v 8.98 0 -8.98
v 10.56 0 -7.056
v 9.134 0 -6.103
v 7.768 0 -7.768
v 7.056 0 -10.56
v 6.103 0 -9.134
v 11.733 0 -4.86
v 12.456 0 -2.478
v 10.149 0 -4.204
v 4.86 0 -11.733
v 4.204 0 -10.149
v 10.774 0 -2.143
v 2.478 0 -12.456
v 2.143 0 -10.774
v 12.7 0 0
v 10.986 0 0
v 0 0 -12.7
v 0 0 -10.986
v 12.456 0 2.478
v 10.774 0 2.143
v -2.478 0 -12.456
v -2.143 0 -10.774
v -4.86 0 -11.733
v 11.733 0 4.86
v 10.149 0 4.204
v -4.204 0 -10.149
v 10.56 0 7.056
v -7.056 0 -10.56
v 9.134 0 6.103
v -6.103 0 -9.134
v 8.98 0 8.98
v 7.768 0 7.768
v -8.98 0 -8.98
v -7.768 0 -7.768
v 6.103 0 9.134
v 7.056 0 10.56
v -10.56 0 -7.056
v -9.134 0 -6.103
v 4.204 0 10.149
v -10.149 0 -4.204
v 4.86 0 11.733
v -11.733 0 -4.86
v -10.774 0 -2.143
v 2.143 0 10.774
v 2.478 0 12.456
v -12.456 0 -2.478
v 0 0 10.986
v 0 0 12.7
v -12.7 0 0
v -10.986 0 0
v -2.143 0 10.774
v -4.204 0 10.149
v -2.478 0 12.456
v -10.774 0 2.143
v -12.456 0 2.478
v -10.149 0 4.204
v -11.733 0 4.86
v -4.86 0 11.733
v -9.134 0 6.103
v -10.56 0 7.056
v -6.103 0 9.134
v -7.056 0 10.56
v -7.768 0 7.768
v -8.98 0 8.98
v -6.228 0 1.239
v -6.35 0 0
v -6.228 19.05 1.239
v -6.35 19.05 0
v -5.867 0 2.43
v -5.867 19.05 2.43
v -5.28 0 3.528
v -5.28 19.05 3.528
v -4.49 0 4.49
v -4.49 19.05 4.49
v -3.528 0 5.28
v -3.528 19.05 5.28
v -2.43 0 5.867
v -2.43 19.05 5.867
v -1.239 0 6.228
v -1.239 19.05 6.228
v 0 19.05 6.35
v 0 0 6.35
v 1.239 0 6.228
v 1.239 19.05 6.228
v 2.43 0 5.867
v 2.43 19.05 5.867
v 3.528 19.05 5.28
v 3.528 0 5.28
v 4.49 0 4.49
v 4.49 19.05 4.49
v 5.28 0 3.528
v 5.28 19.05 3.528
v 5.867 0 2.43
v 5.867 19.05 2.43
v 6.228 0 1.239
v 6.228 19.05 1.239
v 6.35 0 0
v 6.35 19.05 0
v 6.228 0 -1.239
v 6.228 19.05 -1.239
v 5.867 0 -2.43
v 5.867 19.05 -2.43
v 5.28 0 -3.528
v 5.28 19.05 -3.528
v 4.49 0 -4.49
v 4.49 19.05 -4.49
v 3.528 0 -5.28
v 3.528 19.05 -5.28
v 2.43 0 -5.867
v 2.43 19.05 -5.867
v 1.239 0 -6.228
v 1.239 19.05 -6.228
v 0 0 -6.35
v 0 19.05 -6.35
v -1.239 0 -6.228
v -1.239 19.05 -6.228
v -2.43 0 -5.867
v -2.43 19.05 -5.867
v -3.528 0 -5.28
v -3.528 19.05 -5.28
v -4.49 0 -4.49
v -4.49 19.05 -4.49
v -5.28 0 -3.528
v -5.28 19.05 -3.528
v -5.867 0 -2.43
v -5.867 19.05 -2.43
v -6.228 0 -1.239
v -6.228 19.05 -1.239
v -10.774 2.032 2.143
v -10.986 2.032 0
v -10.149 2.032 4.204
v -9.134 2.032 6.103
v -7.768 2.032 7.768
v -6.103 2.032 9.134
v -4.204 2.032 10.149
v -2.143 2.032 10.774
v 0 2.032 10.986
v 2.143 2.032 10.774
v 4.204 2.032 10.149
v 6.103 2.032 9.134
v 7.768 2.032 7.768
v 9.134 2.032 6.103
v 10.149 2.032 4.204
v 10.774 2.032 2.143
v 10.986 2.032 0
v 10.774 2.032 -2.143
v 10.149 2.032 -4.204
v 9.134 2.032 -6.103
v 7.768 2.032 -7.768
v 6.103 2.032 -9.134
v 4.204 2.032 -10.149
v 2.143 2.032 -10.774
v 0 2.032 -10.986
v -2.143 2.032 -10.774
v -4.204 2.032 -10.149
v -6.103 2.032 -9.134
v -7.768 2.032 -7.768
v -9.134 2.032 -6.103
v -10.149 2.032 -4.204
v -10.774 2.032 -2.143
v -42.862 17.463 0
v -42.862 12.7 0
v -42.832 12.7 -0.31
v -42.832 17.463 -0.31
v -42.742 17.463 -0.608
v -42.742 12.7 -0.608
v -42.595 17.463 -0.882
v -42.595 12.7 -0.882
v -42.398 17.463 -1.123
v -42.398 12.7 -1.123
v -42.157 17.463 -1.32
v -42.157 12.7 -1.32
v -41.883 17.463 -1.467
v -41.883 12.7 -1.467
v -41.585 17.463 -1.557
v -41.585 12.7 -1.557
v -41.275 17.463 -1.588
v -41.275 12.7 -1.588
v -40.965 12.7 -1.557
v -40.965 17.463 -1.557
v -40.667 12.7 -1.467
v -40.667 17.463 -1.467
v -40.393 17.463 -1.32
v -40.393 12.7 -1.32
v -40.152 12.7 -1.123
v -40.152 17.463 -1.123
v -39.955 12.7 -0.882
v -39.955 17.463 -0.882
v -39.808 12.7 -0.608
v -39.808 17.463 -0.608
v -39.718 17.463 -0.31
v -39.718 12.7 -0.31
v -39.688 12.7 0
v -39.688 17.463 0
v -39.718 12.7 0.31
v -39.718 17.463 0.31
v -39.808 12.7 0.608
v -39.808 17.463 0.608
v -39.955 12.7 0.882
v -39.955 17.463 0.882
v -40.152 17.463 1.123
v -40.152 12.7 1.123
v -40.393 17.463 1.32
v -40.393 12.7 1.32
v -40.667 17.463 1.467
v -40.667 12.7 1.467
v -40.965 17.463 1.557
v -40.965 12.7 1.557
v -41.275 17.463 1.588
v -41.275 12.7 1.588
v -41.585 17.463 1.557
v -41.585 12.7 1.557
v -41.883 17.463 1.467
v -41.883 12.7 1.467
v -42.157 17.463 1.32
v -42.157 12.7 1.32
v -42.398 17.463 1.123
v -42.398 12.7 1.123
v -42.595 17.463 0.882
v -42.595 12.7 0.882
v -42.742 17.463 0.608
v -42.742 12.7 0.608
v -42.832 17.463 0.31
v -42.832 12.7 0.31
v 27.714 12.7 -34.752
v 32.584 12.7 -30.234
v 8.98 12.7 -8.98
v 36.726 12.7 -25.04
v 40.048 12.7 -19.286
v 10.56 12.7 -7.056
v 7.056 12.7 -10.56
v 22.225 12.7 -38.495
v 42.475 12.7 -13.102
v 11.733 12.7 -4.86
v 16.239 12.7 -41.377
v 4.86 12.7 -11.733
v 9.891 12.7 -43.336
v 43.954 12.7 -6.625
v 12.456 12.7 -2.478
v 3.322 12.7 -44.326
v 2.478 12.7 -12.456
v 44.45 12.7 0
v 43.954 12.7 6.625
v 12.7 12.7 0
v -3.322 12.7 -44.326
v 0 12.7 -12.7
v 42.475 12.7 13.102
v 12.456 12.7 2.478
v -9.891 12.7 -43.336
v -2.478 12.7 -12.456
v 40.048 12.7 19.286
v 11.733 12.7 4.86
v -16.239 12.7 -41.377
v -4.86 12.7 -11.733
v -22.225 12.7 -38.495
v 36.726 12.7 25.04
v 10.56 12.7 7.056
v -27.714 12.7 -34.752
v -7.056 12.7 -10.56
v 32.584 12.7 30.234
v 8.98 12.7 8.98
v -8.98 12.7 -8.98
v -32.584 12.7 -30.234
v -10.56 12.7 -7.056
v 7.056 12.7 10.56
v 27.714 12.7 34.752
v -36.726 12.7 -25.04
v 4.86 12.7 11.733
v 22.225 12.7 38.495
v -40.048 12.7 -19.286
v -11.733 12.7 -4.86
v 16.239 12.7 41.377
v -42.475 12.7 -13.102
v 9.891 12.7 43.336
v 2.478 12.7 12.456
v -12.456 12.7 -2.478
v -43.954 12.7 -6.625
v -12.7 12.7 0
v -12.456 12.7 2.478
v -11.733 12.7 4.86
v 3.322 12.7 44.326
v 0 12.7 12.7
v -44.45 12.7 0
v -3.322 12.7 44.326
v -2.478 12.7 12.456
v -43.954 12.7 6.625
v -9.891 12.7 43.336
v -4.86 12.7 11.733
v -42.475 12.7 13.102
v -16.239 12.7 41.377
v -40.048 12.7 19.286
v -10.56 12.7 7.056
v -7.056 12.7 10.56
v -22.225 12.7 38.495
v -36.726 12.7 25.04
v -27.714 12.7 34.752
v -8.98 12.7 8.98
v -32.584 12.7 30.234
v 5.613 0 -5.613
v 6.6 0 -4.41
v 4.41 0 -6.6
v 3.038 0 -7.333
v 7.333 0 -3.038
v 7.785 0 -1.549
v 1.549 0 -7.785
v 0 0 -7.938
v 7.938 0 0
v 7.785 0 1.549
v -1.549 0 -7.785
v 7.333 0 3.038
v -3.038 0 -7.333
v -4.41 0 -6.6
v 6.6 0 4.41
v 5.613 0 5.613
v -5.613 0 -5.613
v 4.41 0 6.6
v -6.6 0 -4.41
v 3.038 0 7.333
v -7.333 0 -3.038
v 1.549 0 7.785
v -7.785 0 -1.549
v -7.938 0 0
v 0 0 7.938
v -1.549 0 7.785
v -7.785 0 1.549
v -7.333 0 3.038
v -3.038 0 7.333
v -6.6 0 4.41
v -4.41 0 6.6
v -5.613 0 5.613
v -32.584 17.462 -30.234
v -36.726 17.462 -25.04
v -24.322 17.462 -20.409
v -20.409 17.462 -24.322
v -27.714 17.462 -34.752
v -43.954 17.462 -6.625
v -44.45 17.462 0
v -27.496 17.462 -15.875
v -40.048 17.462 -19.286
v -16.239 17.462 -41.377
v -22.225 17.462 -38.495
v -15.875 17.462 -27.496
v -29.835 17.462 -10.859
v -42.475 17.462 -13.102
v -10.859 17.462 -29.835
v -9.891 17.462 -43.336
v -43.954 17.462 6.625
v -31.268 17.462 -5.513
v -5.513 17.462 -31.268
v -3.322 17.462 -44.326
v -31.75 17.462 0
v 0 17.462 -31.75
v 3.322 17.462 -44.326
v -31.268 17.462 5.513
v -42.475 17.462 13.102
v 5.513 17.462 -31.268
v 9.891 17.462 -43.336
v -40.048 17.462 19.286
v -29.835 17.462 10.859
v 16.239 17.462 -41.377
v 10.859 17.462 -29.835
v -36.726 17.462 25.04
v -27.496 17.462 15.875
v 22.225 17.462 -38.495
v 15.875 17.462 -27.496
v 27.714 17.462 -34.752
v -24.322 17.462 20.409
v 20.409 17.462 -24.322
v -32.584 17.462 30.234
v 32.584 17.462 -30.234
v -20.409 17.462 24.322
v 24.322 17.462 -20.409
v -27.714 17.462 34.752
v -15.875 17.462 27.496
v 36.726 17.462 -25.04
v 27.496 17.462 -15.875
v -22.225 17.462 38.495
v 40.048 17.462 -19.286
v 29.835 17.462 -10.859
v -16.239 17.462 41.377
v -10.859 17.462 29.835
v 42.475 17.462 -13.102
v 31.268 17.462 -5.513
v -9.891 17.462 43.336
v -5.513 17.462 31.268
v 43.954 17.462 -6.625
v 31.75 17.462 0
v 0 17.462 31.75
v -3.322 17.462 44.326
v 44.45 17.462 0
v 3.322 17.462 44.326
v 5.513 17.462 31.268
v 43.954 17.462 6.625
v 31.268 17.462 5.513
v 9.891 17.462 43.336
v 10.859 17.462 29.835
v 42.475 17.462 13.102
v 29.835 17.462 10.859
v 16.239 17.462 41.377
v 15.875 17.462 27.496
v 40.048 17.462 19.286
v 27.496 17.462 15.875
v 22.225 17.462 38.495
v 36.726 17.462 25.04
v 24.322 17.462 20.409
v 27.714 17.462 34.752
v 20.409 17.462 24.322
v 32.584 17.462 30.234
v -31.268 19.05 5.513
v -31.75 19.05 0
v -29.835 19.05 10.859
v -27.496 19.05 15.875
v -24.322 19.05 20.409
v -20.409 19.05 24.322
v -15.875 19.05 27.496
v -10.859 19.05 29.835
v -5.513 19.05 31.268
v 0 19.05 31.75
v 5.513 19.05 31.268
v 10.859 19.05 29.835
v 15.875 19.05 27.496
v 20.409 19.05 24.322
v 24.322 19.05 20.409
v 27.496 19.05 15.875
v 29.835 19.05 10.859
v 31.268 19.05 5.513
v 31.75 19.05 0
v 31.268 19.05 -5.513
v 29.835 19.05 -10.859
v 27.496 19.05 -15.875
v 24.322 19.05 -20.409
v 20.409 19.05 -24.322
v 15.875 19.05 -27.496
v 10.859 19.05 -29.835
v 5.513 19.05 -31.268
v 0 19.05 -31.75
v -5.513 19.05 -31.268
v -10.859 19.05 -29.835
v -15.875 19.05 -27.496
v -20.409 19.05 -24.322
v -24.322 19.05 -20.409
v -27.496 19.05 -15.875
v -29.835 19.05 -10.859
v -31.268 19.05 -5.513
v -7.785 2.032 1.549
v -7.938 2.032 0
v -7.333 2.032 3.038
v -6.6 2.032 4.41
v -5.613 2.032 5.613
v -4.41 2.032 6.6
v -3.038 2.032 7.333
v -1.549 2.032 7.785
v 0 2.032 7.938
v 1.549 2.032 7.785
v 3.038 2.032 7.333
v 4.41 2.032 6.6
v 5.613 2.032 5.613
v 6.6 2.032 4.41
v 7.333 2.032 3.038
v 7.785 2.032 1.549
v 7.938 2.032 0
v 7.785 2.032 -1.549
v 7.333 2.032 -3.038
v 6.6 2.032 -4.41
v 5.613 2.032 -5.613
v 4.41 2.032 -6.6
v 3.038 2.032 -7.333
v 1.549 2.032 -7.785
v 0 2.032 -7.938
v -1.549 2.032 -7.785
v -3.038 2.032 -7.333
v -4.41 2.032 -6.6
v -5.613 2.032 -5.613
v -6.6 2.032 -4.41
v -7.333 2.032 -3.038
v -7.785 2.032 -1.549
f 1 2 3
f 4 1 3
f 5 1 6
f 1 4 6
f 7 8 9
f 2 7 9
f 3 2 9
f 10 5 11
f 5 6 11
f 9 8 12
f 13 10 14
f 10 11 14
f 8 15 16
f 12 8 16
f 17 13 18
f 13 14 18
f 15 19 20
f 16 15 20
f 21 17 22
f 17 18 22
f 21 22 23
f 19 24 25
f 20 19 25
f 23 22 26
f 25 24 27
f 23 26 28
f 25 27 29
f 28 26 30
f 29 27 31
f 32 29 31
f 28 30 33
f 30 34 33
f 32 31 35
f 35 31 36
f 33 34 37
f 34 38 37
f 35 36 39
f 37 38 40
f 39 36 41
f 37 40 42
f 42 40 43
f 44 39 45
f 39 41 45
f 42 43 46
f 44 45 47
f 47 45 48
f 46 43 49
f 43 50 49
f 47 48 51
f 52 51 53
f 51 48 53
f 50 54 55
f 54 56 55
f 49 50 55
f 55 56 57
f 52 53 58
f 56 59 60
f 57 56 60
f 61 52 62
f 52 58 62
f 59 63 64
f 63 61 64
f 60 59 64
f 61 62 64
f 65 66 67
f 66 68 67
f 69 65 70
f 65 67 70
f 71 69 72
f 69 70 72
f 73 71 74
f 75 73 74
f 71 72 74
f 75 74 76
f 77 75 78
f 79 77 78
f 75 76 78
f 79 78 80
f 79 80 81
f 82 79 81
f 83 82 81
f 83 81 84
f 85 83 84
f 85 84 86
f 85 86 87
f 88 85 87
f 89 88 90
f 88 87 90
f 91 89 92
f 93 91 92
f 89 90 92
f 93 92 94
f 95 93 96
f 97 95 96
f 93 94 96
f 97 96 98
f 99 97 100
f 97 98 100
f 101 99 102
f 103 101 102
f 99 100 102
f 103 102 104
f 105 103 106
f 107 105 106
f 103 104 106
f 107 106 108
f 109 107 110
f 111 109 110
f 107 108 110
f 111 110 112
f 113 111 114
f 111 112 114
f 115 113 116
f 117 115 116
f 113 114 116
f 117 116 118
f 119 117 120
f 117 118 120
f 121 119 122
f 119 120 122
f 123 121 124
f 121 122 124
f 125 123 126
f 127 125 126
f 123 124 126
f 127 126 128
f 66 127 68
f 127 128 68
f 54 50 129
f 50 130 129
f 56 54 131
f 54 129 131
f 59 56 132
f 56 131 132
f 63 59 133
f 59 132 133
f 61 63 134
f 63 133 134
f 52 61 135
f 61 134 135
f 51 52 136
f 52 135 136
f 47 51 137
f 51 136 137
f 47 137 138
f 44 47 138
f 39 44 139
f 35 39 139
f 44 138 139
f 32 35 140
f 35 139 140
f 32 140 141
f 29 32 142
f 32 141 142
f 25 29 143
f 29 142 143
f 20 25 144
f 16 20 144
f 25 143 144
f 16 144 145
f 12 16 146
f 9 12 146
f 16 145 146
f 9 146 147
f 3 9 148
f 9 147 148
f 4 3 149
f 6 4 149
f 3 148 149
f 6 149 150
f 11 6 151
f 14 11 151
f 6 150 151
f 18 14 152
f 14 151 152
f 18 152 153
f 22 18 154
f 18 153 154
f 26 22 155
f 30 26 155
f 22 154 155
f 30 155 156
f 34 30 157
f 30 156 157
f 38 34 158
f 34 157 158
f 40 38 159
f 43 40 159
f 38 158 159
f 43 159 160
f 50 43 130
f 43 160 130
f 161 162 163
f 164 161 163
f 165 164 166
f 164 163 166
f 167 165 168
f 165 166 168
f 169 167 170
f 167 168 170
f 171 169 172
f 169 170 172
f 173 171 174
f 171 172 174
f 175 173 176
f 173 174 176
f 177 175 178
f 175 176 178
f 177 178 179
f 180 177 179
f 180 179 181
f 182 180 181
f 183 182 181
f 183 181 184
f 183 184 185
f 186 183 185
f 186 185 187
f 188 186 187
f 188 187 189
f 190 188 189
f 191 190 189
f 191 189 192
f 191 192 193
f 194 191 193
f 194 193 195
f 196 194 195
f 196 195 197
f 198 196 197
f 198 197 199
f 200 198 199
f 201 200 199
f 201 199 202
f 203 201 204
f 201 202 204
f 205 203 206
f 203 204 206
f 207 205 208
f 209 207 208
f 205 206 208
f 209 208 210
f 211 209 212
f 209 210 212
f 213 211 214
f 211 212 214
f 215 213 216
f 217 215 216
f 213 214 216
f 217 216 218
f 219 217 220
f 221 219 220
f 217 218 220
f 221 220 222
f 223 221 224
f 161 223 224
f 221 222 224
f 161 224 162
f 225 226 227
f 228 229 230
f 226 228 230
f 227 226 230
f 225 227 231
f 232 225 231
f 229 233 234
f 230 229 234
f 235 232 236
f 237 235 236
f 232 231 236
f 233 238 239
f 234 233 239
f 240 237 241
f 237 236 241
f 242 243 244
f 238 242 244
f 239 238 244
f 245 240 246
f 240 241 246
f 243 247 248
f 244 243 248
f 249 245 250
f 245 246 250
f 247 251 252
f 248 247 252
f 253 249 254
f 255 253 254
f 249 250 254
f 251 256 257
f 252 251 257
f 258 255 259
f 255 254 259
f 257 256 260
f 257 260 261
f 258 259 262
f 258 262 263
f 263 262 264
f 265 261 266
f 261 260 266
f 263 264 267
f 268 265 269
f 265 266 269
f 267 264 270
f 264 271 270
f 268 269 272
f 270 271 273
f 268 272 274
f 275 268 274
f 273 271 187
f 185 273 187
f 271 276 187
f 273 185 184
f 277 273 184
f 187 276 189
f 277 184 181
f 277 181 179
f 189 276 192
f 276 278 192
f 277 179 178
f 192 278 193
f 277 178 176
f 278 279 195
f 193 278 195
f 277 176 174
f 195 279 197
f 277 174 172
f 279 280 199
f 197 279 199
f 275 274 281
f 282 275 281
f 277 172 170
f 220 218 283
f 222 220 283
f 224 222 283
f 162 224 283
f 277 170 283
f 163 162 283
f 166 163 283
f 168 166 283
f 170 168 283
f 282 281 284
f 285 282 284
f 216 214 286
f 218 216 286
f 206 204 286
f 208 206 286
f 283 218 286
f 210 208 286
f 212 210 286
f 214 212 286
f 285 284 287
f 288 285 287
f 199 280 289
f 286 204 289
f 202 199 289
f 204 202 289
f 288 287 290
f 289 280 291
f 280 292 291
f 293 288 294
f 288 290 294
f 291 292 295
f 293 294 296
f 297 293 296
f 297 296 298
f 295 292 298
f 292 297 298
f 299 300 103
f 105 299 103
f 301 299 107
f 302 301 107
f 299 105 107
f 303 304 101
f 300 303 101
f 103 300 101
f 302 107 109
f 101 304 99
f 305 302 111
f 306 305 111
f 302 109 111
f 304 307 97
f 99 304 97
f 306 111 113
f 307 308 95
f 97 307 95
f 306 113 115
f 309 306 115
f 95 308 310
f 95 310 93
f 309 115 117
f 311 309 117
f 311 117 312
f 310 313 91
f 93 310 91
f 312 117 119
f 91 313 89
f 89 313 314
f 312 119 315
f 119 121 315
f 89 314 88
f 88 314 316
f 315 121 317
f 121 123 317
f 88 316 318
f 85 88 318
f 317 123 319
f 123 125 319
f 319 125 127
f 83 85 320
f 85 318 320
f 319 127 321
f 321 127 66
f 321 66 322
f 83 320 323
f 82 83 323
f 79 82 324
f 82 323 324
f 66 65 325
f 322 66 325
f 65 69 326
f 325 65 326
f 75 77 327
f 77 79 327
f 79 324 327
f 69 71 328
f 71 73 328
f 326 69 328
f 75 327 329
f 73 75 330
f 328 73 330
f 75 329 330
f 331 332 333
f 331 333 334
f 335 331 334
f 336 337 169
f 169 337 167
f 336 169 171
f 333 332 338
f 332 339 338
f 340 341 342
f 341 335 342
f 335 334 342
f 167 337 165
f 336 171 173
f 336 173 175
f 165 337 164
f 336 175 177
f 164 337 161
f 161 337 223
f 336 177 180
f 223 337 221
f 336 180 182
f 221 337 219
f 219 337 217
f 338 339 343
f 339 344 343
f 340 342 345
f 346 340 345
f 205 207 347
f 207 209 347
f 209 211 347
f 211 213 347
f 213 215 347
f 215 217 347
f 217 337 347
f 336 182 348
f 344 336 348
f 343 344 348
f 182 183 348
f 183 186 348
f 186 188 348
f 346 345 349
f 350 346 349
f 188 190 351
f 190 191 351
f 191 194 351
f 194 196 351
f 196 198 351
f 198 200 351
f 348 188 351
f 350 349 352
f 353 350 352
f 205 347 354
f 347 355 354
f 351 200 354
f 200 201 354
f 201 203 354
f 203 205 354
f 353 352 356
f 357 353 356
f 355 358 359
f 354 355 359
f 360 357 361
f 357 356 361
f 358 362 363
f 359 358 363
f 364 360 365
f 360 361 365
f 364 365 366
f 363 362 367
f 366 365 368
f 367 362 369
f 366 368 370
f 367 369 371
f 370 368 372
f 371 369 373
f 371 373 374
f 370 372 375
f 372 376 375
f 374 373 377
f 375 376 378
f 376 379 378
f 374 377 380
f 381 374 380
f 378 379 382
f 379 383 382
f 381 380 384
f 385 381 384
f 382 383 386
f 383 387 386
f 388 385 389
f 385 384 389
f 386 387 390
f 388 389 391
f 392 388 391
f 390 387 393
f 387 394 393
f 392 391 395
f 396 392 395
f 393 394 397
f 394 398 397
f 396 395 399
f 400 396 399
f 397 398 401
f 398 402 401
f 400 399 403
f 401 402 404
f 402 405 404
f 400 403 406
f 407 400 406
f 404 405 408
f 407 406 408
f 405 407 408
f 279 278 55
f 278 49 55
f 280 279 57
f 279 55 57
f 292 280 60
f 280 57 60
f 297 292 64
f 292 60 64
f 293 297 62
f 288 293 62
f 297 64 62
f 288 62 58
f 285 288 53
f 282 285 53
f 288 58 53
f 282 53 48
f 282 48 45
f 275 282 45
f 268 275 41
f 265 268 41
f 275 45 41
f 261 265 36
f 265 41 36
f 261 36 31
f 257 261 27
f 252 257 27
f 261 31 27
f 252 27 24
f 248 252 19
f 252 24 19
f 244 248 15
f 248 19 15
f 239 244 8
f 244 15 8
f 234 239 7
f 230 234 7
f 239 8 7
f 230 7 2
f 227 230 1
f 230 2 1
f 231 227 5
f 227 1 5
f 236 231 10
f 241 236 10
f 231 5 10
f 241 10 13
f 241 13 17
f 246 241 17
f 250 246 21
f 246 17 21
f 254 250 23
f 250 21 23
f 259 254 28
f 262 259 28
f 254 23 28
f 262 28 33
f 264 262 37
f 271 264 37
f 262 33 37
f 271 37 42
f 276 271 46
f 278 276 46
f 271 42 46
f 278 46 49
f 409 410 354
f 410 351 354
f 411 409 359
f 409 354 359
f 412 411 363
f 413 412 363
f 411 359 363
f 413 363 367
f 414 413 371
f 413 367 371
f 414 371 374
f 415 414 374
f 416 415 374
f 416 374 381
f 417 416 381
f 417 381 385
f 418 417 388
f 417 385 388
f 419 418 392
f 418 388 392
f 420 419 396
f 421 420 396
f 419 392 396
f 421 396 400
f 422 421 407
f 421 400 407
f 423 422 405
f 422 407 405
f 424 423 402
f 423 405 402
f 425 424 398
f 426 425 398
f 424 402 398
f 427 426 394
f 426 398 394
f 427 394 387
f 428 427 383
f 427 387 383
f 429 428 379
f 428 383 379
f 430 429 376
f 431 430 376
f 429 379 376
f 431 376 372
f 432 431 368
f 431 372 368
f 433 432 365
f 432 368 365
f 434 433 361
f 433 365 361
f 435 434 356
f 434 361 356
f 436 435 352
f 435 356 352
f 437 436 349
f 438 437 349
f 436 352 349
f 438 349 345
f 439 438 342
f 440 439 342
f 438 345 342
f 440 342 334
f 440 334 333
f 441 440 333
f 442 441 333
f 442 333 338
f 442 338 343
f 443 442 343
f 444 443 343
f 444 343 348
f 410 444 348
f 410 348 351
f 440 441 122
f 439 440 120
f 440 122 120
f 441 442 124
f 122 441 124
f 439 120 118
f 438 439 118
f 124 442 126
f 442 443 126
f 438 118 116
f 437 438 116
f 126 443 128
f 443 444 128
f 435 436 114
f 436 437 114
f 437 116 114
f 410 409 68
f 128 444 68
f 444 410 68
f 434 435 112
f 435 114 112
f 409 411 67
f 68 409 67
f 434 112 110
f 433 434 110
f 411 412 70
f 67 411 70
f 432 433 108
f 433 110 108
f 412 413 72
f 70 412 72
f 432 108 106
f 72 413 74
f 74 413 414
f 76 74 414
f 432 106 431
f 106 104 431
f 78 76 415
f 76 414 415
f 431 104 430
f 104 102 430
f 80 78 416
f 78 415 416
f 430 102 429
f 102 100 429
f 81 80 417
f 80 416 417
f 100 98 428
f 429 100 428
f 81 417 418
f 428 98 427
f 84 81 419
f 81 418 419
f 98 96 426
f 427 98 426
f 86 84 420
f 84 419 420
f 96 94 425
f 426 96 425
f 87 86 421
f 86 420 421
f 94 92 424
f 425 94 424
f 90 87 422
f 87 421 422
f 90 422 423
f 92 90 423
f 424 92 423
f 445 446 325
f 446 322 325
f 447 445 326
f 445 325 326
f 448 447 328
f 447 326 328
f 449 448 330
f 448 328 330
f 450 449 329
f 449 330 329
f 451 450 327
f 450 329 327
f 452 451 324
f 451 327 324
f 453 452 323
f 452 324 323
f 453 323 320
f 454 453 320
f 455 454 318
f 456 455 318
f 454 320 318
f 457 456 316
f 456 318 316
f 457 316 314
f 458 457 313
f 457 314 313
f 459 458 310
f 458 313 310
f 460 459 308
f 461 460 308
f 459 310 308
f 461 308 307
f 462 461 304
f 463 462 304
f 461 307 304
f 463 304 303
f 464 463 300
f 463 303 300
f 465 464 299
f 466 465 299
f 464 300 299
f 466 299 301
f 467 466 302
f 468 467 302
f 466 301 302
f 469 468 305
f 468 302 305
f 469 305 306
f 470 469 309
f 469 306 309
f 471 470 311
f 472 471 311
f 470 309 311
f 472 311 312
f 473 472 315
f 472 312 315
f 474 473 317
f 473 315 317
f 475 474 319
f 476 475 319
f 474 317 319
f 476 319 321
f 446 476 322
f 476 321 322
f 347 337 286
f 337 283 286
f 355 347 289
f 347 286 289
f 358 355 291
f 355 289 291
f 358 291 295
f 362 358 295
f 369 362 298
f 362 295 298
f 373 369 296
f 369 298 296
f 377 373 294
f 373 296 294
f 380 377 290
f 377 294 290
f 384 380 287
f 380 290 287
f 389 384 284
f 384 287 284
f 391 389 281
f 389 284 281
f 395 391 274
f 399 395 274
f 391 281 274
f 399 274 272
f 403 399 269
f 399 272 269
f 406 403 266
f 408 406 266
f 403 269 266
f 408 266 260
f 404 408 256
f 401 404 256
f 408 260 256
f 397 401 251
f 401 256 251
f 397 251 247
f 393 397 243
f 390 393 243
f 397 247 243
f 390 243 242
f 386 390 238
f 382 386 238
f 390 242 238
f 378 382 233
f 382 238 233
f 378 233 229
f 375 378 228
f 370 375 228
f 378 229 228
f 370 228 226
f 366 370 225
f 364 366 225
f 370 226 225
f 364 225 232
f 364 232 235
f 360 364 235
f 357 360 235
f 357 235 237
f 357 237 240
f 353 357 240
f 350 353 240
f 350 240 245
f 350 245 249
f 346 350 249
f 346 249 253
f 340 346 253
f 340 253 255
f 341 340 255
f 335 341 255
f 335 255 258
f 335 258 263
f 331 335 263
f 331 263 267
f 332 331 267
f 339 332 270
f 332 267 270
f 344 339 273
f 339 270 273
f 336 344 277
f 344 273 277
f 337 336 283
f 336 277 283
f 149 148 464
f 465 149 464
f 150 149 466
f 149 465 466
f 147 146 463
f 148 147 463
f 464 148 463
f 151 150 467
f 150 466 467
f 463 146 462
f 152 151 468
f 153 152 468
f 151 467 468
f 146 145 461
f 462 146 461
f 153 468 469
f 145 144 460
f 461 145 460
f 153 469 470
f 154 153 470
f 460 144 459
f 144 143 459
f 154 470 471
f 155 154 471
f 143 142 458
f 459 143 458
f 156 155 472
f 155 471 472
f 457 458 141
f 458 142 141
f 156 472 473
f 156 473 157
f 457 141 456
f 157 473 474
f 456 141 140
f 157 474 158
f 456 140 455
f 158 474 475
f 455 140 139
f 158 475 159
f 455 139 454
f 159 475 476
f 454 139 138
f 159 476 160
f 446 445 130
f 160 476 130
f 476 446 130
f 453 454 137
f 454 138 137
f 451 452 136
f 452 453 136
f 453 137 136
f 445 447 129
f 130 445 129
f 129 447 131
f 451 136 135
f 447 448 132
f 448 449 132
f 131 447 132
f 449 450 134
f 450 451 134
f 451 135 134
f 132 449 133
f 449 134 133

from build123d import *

# Parameters (mm, degrees)
F_1_8_0_125_DIAMETER_HOLE1_D = 3.175


with BuildPart() as part:
    # Sketch1 → Revolve1 (revolve)
    with BuildSketch(Plane.XY):
        Polygon((-6.35, 0), (-6.35, 19.05), (-31.75, 19.05), (-31.75, 17.4625), (-44.45, 17.4625), (-44.45, 12.7), (-12.7, 12.7), (-12.7, 0), (-10.9855, 0), (-10.9855, 2.032), (-7.9375, 2.032), (-7.9375, 0), align=None)
    revolve(axis=Axis((0, 0, 0), (0, 1, 0)))

    # 1/8 (0.125) Diameter Hole1 (through all)
    with Locations(Plane(origin=(0, 17.4625, 0), x_dir=(1, 0, 0), z_dir=(0, 1, 0))):
        with Locations((-41.275, 0)):
            Hole(F_1_8_0_125_DIAMETER_HOLE1_D / 2)


solid = part.part
